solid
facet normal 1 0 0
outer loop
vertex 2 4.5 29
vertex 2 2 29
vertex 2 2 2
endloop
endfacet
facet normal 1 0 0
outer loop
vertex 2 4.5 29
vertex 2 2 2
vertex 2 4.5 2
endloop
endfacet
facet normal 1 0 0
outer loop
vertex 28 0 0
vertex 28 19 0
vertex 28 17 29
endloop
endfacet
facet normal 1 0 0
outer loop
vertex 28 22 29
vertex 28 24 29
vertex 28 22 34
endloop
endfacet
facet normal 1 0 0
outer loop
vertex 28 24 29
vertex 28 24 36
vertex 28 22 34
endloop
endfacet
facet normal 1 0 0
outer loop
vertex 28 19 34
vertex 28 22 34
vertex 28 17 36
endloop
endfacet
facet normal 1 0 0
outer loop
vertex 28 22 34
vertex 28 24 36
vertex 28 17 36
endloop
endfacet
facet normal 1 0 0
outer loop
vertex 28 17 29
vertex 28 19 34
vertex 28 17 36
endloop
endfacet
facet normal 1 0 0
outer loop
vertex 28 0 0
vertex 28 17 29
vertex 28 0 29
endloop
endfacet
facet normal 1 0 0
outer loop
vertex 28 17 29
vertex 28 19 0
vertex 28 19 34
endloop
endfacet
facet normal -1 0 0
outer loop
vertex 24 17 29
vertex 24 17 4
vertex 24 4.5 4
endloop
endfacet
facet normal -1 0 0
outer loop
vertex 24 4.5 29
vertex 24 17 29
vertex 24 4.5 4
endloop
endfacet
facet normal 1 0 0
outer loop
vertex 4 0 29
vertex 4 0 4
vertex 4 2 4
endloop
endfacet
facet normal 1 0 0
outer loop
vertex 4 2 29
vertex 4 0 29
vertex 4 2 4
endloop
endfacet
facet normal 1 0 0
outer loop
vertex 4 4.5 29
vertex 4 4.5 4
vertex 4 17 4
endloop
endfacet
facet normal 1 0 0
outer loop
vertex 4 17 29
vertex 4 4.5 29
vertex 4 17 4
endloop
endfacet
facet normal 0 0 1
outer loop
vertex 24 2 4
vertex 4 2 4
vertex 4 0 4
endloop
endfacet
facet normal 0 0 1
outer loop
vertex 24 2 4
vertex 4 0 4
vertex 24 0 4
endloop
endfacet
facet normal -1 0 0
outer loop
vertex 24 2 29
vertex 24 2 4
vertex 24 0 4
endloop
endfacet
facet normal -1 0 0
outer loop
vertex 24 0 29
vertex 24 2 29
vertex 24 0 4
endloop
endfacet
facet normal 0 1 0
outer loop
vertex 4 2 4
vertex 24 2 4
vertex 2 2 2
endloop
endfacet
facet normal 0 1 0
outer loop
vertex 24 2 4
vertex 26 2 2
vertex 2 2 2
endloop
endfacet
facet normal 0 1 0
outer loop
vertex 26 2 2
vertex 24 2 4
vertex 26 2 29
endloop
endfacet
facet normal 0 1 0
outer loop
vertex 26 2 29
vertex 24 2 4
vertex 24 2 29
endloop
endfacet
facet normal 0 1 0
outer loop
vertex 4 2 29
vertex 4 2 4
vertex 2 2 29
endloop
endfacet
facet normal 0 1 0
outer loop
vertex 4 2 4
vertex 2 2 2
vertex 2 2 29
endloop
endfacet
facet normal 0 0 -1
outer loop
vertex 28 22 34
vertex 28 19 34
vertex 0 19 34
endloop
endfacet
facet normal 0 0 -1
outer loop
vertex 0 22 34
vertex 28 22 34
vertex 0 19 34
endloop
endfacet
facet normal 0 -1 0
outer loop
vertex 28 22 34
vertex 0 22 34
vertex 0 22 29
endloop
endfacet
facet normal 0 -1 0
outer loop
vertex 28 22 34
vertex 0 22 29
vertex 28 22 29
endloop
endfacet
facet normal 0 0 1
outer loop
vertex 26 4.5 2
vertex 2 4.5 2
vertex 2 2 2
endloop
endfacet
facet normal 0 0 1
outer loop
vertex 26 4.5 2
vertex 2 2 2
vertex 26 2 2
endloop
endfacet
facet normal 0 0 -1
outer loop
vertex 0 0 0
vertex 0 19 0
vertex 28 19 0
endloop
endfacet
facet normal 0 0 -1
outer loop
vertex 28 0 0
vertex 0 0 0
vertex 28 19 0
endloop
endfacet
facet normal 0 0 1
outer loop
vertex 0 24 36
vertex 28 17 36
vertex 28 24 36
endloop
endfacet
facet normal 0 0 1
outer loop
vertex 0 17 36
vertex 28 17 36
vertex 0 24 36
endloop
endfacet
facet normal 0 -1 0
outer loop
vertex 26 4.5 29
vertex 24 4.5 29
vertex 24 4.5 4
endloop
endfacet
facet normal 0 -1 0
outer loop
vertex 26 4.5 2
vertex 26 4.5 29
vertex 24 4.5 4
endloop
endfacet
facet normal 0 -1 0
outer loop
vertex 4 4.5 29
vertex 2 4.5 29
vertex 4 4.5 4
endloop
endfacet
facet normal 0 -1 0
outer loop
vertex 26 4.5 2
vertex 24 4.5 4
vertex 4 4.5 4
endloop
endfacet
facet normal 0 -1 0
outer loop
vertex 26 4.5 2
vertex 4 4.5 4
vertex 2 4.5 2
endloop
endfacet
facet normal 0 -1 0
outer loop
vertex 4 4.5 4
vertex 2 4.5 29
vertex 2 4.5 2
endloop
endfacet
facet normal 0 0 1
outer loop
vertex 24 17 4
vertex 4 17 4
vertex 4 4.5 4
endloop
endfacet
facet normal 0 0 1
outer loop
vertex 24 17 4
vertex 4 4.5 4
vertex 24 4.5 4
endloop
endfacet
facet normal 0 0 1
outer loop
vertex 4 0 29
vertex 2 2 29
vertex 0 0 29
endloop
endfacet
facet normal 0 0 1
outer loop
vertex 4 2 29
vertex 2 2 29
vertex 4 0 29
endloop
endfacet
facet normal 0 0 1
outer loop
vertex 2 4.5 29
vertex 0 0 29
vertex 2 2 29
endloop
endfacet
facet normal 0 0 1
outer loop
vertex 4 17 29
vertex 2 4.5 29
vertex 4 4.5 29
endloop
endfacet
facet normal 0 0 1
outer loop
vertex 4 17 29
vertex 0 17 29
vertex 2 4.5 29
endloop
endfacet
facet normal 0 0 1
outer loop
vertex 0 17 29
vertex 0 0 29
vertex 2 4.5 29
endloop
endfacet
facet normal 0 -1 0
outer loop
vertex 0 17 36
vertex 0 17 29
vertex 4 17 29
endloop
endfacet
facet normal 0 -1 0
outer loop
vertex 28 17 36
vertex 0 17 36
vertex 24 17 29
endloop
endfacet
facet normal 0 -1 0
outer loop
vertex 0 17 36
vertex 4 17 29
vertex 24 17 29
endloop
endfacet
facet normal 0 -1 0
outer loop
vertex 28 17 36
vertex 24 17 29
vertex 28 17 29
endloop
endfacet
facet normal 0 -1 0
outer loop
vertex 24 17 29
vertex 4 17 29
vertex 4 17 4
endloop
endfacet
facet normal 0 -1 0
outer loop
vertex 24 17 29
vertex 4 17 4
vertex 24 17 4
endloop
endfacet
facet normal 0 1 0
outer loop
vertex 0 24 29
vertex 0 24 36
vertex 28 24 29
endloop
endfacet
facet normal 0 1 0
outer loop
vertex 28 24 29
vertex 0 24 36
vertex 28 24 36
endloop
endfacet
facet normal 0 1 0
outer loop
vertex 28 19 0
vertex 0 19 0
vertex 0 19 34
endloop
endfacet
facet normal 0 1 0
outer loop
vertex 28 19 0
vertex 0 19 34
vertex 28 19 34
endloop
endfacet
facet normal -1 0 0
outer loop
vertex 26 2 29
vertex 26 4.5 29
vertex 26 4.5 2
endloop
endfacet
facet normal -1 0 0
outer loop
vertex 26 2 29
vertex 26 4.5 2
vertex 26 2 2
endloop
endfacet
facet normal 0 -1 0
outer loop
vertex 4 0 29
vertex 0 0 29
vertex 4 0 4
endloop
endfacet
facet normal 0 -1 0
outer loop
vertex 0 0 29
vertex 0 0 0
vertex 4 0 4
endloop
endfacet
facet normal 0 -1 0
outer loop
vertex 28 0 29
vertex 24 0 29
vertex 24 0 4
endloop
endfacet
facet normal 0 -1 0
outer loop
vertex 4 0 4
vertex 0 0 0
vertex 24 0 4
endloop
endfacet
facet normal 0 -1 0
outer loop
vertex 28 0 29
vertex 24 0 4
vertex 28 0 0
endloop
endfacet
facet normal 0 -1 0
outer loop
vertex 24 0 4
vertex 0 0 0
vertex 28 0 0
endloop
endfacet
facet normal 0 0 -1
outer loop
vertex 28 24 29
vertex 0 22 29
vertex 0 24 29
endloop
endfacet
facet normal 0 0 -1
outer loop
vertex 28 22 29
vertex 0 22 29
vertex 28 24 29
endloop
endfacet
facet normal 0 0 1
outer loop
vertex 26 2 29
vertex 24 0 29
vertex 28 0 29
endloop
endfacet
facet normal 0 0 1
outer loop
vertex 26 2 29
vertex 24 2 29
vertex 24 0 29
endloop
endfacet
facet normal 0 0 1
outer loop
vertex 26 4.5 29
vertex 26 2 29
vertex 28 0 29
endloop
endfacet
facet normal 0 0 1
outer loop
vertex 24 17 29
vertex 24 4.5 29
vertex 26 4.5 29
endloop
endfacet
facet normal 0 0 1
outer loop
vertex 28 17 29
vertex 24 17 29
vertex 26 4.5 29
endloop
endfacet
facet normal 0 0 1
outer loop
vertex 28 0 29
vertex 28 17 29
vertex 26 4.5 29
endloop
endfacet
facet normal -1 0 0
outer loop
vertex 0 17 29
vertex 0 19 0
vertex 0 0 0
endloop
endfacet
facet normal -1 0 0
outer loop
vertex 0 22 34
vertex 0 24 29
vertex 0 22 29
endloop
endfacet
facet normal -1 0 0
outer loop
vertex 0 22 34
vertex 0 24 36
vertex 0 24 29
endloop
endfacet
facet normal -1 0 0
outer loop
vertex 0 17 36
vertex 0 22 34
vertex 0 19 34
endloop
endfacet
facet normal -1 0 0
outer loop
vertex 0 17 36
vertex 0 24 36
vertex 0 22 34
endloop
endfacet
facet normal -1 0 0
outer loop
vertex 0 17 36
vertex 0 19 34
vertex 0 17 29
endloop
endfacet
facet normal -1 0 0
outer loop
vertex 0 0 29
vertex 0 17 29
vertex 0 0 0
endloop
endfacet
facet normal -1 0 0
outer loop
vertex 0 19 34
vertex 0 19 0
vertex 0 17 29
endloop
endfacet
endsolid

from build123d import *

# Parameters (mm, degrees)
F0_W      = 28
F0_H      = 19
F1_DEPTH  = 4
F2_W      = 20
F2_H      = 2
F3_DEPTH  = 25
F4_W      = 24
F4_H      = 2.5
F5_DEPTH  = 2
F6_W      = 2.5
F6_H      = 2
F6_H_2    = 25
F7_DEPTH  = 2
F8_W      = 2.5
F8_H      = 2
F8_H_2    = 25
F9_DEPTH  = 2
F10_W     = 28
F10_H     = 2
F11_DEPTH = 7
F12_W     = 28
F12_H     = 2
F13_DEPTH = 5
F14_W     = 28
F14_H     = 2
F15_DEPTH = 5


with BuildPart() as f1:
    # F0 (on Top) → F1 (new body)
    with BuildSketch(Plane.XY):
        with Locations((14, 9.5)):
            Rectangle(F0_W, F0_H)
    extrude(amount=F1_DEPTH)

    # F2 (on face) → F3 (join)
    with BuildSketch(Plane.XY.offset(4)):
        Polygon((0, 19), (0, 0), (4, 0), (4, 17), (4, 19), align=None)
        with Locations((14, 18)):
            Rectangle(F2_W, F2_H)
        Polygon((24, 19), (24, 17), (24, 0), (28, 0), (28, 19), align=None)
    extrude(amount=F3_DEPTH)

    # F4 (on face) → F5 (cut)
    with BuildSketch(Plane.XY.offset(4)):
        with Locations((14, 3.25)):
            Rectangle(F4_W, F4_H)
    extrude(amount=-F5_DEPTH, mode=Mode.SUBTRACT)

    # F6 (on face) → F7 (cut)
    with BuildSketch(Plane(origin=(24, 0, 0), x_dir=(0, -1, 0), z_dir=(-1, 0, 0))):
        with Locations((-3.25, 3)):
            Rectangle(F6_W, F6_H)
        with Locations((-3.25, 16.5)):
            Rectangle(F6_W, F6_H_2)
    extrude(amount=-F7_DEPTH, mode=Mode.SUBTRACT)

    # F8 (on face) → F9 (cut)
    with BuildSketch(Plane.YZ.offset(4)):
        with Locations((3.25, 3)):
            Rectangle(F8_W, F8_H)
        with Locations((3.25, 16.5)):
            Rectangle(F8_W, F8_H_2)
    extrude(amount=-F9_DEPTH, mode=Mode.SUBTRACT)

    # F10 (on face) → F11 (join)
    with BuildSketch(Plane.XY.offset(29)):
        with Locations((14, 18)):
            Rectangle(F10_W, F10_H)
    extrude(amount=F11_DEPTH)

    # F12 (on face) → F13 (join)
    with BuildSketch(Plane(origin=(0, 19, 0), x_dir=(-1, 0, 0), z_dir=(0, 1, 0))):
        with Locations((-14, 35)):
            Rectangle(F12_W, F12_H)
    extrude(amount=F13_DEPTH)

    # F14 (on face) → F15 (join)
    with BuildSketch(Plane(origin=(0, 0, 34), x_dir=(1, 0, 0), z_dir=(0, 0, -1))):
        with Locations((14, -23)):
            Rectangle(F14_W, F14_H)
    extrude(amount=F15_DEPTH)


solid = f1.part
